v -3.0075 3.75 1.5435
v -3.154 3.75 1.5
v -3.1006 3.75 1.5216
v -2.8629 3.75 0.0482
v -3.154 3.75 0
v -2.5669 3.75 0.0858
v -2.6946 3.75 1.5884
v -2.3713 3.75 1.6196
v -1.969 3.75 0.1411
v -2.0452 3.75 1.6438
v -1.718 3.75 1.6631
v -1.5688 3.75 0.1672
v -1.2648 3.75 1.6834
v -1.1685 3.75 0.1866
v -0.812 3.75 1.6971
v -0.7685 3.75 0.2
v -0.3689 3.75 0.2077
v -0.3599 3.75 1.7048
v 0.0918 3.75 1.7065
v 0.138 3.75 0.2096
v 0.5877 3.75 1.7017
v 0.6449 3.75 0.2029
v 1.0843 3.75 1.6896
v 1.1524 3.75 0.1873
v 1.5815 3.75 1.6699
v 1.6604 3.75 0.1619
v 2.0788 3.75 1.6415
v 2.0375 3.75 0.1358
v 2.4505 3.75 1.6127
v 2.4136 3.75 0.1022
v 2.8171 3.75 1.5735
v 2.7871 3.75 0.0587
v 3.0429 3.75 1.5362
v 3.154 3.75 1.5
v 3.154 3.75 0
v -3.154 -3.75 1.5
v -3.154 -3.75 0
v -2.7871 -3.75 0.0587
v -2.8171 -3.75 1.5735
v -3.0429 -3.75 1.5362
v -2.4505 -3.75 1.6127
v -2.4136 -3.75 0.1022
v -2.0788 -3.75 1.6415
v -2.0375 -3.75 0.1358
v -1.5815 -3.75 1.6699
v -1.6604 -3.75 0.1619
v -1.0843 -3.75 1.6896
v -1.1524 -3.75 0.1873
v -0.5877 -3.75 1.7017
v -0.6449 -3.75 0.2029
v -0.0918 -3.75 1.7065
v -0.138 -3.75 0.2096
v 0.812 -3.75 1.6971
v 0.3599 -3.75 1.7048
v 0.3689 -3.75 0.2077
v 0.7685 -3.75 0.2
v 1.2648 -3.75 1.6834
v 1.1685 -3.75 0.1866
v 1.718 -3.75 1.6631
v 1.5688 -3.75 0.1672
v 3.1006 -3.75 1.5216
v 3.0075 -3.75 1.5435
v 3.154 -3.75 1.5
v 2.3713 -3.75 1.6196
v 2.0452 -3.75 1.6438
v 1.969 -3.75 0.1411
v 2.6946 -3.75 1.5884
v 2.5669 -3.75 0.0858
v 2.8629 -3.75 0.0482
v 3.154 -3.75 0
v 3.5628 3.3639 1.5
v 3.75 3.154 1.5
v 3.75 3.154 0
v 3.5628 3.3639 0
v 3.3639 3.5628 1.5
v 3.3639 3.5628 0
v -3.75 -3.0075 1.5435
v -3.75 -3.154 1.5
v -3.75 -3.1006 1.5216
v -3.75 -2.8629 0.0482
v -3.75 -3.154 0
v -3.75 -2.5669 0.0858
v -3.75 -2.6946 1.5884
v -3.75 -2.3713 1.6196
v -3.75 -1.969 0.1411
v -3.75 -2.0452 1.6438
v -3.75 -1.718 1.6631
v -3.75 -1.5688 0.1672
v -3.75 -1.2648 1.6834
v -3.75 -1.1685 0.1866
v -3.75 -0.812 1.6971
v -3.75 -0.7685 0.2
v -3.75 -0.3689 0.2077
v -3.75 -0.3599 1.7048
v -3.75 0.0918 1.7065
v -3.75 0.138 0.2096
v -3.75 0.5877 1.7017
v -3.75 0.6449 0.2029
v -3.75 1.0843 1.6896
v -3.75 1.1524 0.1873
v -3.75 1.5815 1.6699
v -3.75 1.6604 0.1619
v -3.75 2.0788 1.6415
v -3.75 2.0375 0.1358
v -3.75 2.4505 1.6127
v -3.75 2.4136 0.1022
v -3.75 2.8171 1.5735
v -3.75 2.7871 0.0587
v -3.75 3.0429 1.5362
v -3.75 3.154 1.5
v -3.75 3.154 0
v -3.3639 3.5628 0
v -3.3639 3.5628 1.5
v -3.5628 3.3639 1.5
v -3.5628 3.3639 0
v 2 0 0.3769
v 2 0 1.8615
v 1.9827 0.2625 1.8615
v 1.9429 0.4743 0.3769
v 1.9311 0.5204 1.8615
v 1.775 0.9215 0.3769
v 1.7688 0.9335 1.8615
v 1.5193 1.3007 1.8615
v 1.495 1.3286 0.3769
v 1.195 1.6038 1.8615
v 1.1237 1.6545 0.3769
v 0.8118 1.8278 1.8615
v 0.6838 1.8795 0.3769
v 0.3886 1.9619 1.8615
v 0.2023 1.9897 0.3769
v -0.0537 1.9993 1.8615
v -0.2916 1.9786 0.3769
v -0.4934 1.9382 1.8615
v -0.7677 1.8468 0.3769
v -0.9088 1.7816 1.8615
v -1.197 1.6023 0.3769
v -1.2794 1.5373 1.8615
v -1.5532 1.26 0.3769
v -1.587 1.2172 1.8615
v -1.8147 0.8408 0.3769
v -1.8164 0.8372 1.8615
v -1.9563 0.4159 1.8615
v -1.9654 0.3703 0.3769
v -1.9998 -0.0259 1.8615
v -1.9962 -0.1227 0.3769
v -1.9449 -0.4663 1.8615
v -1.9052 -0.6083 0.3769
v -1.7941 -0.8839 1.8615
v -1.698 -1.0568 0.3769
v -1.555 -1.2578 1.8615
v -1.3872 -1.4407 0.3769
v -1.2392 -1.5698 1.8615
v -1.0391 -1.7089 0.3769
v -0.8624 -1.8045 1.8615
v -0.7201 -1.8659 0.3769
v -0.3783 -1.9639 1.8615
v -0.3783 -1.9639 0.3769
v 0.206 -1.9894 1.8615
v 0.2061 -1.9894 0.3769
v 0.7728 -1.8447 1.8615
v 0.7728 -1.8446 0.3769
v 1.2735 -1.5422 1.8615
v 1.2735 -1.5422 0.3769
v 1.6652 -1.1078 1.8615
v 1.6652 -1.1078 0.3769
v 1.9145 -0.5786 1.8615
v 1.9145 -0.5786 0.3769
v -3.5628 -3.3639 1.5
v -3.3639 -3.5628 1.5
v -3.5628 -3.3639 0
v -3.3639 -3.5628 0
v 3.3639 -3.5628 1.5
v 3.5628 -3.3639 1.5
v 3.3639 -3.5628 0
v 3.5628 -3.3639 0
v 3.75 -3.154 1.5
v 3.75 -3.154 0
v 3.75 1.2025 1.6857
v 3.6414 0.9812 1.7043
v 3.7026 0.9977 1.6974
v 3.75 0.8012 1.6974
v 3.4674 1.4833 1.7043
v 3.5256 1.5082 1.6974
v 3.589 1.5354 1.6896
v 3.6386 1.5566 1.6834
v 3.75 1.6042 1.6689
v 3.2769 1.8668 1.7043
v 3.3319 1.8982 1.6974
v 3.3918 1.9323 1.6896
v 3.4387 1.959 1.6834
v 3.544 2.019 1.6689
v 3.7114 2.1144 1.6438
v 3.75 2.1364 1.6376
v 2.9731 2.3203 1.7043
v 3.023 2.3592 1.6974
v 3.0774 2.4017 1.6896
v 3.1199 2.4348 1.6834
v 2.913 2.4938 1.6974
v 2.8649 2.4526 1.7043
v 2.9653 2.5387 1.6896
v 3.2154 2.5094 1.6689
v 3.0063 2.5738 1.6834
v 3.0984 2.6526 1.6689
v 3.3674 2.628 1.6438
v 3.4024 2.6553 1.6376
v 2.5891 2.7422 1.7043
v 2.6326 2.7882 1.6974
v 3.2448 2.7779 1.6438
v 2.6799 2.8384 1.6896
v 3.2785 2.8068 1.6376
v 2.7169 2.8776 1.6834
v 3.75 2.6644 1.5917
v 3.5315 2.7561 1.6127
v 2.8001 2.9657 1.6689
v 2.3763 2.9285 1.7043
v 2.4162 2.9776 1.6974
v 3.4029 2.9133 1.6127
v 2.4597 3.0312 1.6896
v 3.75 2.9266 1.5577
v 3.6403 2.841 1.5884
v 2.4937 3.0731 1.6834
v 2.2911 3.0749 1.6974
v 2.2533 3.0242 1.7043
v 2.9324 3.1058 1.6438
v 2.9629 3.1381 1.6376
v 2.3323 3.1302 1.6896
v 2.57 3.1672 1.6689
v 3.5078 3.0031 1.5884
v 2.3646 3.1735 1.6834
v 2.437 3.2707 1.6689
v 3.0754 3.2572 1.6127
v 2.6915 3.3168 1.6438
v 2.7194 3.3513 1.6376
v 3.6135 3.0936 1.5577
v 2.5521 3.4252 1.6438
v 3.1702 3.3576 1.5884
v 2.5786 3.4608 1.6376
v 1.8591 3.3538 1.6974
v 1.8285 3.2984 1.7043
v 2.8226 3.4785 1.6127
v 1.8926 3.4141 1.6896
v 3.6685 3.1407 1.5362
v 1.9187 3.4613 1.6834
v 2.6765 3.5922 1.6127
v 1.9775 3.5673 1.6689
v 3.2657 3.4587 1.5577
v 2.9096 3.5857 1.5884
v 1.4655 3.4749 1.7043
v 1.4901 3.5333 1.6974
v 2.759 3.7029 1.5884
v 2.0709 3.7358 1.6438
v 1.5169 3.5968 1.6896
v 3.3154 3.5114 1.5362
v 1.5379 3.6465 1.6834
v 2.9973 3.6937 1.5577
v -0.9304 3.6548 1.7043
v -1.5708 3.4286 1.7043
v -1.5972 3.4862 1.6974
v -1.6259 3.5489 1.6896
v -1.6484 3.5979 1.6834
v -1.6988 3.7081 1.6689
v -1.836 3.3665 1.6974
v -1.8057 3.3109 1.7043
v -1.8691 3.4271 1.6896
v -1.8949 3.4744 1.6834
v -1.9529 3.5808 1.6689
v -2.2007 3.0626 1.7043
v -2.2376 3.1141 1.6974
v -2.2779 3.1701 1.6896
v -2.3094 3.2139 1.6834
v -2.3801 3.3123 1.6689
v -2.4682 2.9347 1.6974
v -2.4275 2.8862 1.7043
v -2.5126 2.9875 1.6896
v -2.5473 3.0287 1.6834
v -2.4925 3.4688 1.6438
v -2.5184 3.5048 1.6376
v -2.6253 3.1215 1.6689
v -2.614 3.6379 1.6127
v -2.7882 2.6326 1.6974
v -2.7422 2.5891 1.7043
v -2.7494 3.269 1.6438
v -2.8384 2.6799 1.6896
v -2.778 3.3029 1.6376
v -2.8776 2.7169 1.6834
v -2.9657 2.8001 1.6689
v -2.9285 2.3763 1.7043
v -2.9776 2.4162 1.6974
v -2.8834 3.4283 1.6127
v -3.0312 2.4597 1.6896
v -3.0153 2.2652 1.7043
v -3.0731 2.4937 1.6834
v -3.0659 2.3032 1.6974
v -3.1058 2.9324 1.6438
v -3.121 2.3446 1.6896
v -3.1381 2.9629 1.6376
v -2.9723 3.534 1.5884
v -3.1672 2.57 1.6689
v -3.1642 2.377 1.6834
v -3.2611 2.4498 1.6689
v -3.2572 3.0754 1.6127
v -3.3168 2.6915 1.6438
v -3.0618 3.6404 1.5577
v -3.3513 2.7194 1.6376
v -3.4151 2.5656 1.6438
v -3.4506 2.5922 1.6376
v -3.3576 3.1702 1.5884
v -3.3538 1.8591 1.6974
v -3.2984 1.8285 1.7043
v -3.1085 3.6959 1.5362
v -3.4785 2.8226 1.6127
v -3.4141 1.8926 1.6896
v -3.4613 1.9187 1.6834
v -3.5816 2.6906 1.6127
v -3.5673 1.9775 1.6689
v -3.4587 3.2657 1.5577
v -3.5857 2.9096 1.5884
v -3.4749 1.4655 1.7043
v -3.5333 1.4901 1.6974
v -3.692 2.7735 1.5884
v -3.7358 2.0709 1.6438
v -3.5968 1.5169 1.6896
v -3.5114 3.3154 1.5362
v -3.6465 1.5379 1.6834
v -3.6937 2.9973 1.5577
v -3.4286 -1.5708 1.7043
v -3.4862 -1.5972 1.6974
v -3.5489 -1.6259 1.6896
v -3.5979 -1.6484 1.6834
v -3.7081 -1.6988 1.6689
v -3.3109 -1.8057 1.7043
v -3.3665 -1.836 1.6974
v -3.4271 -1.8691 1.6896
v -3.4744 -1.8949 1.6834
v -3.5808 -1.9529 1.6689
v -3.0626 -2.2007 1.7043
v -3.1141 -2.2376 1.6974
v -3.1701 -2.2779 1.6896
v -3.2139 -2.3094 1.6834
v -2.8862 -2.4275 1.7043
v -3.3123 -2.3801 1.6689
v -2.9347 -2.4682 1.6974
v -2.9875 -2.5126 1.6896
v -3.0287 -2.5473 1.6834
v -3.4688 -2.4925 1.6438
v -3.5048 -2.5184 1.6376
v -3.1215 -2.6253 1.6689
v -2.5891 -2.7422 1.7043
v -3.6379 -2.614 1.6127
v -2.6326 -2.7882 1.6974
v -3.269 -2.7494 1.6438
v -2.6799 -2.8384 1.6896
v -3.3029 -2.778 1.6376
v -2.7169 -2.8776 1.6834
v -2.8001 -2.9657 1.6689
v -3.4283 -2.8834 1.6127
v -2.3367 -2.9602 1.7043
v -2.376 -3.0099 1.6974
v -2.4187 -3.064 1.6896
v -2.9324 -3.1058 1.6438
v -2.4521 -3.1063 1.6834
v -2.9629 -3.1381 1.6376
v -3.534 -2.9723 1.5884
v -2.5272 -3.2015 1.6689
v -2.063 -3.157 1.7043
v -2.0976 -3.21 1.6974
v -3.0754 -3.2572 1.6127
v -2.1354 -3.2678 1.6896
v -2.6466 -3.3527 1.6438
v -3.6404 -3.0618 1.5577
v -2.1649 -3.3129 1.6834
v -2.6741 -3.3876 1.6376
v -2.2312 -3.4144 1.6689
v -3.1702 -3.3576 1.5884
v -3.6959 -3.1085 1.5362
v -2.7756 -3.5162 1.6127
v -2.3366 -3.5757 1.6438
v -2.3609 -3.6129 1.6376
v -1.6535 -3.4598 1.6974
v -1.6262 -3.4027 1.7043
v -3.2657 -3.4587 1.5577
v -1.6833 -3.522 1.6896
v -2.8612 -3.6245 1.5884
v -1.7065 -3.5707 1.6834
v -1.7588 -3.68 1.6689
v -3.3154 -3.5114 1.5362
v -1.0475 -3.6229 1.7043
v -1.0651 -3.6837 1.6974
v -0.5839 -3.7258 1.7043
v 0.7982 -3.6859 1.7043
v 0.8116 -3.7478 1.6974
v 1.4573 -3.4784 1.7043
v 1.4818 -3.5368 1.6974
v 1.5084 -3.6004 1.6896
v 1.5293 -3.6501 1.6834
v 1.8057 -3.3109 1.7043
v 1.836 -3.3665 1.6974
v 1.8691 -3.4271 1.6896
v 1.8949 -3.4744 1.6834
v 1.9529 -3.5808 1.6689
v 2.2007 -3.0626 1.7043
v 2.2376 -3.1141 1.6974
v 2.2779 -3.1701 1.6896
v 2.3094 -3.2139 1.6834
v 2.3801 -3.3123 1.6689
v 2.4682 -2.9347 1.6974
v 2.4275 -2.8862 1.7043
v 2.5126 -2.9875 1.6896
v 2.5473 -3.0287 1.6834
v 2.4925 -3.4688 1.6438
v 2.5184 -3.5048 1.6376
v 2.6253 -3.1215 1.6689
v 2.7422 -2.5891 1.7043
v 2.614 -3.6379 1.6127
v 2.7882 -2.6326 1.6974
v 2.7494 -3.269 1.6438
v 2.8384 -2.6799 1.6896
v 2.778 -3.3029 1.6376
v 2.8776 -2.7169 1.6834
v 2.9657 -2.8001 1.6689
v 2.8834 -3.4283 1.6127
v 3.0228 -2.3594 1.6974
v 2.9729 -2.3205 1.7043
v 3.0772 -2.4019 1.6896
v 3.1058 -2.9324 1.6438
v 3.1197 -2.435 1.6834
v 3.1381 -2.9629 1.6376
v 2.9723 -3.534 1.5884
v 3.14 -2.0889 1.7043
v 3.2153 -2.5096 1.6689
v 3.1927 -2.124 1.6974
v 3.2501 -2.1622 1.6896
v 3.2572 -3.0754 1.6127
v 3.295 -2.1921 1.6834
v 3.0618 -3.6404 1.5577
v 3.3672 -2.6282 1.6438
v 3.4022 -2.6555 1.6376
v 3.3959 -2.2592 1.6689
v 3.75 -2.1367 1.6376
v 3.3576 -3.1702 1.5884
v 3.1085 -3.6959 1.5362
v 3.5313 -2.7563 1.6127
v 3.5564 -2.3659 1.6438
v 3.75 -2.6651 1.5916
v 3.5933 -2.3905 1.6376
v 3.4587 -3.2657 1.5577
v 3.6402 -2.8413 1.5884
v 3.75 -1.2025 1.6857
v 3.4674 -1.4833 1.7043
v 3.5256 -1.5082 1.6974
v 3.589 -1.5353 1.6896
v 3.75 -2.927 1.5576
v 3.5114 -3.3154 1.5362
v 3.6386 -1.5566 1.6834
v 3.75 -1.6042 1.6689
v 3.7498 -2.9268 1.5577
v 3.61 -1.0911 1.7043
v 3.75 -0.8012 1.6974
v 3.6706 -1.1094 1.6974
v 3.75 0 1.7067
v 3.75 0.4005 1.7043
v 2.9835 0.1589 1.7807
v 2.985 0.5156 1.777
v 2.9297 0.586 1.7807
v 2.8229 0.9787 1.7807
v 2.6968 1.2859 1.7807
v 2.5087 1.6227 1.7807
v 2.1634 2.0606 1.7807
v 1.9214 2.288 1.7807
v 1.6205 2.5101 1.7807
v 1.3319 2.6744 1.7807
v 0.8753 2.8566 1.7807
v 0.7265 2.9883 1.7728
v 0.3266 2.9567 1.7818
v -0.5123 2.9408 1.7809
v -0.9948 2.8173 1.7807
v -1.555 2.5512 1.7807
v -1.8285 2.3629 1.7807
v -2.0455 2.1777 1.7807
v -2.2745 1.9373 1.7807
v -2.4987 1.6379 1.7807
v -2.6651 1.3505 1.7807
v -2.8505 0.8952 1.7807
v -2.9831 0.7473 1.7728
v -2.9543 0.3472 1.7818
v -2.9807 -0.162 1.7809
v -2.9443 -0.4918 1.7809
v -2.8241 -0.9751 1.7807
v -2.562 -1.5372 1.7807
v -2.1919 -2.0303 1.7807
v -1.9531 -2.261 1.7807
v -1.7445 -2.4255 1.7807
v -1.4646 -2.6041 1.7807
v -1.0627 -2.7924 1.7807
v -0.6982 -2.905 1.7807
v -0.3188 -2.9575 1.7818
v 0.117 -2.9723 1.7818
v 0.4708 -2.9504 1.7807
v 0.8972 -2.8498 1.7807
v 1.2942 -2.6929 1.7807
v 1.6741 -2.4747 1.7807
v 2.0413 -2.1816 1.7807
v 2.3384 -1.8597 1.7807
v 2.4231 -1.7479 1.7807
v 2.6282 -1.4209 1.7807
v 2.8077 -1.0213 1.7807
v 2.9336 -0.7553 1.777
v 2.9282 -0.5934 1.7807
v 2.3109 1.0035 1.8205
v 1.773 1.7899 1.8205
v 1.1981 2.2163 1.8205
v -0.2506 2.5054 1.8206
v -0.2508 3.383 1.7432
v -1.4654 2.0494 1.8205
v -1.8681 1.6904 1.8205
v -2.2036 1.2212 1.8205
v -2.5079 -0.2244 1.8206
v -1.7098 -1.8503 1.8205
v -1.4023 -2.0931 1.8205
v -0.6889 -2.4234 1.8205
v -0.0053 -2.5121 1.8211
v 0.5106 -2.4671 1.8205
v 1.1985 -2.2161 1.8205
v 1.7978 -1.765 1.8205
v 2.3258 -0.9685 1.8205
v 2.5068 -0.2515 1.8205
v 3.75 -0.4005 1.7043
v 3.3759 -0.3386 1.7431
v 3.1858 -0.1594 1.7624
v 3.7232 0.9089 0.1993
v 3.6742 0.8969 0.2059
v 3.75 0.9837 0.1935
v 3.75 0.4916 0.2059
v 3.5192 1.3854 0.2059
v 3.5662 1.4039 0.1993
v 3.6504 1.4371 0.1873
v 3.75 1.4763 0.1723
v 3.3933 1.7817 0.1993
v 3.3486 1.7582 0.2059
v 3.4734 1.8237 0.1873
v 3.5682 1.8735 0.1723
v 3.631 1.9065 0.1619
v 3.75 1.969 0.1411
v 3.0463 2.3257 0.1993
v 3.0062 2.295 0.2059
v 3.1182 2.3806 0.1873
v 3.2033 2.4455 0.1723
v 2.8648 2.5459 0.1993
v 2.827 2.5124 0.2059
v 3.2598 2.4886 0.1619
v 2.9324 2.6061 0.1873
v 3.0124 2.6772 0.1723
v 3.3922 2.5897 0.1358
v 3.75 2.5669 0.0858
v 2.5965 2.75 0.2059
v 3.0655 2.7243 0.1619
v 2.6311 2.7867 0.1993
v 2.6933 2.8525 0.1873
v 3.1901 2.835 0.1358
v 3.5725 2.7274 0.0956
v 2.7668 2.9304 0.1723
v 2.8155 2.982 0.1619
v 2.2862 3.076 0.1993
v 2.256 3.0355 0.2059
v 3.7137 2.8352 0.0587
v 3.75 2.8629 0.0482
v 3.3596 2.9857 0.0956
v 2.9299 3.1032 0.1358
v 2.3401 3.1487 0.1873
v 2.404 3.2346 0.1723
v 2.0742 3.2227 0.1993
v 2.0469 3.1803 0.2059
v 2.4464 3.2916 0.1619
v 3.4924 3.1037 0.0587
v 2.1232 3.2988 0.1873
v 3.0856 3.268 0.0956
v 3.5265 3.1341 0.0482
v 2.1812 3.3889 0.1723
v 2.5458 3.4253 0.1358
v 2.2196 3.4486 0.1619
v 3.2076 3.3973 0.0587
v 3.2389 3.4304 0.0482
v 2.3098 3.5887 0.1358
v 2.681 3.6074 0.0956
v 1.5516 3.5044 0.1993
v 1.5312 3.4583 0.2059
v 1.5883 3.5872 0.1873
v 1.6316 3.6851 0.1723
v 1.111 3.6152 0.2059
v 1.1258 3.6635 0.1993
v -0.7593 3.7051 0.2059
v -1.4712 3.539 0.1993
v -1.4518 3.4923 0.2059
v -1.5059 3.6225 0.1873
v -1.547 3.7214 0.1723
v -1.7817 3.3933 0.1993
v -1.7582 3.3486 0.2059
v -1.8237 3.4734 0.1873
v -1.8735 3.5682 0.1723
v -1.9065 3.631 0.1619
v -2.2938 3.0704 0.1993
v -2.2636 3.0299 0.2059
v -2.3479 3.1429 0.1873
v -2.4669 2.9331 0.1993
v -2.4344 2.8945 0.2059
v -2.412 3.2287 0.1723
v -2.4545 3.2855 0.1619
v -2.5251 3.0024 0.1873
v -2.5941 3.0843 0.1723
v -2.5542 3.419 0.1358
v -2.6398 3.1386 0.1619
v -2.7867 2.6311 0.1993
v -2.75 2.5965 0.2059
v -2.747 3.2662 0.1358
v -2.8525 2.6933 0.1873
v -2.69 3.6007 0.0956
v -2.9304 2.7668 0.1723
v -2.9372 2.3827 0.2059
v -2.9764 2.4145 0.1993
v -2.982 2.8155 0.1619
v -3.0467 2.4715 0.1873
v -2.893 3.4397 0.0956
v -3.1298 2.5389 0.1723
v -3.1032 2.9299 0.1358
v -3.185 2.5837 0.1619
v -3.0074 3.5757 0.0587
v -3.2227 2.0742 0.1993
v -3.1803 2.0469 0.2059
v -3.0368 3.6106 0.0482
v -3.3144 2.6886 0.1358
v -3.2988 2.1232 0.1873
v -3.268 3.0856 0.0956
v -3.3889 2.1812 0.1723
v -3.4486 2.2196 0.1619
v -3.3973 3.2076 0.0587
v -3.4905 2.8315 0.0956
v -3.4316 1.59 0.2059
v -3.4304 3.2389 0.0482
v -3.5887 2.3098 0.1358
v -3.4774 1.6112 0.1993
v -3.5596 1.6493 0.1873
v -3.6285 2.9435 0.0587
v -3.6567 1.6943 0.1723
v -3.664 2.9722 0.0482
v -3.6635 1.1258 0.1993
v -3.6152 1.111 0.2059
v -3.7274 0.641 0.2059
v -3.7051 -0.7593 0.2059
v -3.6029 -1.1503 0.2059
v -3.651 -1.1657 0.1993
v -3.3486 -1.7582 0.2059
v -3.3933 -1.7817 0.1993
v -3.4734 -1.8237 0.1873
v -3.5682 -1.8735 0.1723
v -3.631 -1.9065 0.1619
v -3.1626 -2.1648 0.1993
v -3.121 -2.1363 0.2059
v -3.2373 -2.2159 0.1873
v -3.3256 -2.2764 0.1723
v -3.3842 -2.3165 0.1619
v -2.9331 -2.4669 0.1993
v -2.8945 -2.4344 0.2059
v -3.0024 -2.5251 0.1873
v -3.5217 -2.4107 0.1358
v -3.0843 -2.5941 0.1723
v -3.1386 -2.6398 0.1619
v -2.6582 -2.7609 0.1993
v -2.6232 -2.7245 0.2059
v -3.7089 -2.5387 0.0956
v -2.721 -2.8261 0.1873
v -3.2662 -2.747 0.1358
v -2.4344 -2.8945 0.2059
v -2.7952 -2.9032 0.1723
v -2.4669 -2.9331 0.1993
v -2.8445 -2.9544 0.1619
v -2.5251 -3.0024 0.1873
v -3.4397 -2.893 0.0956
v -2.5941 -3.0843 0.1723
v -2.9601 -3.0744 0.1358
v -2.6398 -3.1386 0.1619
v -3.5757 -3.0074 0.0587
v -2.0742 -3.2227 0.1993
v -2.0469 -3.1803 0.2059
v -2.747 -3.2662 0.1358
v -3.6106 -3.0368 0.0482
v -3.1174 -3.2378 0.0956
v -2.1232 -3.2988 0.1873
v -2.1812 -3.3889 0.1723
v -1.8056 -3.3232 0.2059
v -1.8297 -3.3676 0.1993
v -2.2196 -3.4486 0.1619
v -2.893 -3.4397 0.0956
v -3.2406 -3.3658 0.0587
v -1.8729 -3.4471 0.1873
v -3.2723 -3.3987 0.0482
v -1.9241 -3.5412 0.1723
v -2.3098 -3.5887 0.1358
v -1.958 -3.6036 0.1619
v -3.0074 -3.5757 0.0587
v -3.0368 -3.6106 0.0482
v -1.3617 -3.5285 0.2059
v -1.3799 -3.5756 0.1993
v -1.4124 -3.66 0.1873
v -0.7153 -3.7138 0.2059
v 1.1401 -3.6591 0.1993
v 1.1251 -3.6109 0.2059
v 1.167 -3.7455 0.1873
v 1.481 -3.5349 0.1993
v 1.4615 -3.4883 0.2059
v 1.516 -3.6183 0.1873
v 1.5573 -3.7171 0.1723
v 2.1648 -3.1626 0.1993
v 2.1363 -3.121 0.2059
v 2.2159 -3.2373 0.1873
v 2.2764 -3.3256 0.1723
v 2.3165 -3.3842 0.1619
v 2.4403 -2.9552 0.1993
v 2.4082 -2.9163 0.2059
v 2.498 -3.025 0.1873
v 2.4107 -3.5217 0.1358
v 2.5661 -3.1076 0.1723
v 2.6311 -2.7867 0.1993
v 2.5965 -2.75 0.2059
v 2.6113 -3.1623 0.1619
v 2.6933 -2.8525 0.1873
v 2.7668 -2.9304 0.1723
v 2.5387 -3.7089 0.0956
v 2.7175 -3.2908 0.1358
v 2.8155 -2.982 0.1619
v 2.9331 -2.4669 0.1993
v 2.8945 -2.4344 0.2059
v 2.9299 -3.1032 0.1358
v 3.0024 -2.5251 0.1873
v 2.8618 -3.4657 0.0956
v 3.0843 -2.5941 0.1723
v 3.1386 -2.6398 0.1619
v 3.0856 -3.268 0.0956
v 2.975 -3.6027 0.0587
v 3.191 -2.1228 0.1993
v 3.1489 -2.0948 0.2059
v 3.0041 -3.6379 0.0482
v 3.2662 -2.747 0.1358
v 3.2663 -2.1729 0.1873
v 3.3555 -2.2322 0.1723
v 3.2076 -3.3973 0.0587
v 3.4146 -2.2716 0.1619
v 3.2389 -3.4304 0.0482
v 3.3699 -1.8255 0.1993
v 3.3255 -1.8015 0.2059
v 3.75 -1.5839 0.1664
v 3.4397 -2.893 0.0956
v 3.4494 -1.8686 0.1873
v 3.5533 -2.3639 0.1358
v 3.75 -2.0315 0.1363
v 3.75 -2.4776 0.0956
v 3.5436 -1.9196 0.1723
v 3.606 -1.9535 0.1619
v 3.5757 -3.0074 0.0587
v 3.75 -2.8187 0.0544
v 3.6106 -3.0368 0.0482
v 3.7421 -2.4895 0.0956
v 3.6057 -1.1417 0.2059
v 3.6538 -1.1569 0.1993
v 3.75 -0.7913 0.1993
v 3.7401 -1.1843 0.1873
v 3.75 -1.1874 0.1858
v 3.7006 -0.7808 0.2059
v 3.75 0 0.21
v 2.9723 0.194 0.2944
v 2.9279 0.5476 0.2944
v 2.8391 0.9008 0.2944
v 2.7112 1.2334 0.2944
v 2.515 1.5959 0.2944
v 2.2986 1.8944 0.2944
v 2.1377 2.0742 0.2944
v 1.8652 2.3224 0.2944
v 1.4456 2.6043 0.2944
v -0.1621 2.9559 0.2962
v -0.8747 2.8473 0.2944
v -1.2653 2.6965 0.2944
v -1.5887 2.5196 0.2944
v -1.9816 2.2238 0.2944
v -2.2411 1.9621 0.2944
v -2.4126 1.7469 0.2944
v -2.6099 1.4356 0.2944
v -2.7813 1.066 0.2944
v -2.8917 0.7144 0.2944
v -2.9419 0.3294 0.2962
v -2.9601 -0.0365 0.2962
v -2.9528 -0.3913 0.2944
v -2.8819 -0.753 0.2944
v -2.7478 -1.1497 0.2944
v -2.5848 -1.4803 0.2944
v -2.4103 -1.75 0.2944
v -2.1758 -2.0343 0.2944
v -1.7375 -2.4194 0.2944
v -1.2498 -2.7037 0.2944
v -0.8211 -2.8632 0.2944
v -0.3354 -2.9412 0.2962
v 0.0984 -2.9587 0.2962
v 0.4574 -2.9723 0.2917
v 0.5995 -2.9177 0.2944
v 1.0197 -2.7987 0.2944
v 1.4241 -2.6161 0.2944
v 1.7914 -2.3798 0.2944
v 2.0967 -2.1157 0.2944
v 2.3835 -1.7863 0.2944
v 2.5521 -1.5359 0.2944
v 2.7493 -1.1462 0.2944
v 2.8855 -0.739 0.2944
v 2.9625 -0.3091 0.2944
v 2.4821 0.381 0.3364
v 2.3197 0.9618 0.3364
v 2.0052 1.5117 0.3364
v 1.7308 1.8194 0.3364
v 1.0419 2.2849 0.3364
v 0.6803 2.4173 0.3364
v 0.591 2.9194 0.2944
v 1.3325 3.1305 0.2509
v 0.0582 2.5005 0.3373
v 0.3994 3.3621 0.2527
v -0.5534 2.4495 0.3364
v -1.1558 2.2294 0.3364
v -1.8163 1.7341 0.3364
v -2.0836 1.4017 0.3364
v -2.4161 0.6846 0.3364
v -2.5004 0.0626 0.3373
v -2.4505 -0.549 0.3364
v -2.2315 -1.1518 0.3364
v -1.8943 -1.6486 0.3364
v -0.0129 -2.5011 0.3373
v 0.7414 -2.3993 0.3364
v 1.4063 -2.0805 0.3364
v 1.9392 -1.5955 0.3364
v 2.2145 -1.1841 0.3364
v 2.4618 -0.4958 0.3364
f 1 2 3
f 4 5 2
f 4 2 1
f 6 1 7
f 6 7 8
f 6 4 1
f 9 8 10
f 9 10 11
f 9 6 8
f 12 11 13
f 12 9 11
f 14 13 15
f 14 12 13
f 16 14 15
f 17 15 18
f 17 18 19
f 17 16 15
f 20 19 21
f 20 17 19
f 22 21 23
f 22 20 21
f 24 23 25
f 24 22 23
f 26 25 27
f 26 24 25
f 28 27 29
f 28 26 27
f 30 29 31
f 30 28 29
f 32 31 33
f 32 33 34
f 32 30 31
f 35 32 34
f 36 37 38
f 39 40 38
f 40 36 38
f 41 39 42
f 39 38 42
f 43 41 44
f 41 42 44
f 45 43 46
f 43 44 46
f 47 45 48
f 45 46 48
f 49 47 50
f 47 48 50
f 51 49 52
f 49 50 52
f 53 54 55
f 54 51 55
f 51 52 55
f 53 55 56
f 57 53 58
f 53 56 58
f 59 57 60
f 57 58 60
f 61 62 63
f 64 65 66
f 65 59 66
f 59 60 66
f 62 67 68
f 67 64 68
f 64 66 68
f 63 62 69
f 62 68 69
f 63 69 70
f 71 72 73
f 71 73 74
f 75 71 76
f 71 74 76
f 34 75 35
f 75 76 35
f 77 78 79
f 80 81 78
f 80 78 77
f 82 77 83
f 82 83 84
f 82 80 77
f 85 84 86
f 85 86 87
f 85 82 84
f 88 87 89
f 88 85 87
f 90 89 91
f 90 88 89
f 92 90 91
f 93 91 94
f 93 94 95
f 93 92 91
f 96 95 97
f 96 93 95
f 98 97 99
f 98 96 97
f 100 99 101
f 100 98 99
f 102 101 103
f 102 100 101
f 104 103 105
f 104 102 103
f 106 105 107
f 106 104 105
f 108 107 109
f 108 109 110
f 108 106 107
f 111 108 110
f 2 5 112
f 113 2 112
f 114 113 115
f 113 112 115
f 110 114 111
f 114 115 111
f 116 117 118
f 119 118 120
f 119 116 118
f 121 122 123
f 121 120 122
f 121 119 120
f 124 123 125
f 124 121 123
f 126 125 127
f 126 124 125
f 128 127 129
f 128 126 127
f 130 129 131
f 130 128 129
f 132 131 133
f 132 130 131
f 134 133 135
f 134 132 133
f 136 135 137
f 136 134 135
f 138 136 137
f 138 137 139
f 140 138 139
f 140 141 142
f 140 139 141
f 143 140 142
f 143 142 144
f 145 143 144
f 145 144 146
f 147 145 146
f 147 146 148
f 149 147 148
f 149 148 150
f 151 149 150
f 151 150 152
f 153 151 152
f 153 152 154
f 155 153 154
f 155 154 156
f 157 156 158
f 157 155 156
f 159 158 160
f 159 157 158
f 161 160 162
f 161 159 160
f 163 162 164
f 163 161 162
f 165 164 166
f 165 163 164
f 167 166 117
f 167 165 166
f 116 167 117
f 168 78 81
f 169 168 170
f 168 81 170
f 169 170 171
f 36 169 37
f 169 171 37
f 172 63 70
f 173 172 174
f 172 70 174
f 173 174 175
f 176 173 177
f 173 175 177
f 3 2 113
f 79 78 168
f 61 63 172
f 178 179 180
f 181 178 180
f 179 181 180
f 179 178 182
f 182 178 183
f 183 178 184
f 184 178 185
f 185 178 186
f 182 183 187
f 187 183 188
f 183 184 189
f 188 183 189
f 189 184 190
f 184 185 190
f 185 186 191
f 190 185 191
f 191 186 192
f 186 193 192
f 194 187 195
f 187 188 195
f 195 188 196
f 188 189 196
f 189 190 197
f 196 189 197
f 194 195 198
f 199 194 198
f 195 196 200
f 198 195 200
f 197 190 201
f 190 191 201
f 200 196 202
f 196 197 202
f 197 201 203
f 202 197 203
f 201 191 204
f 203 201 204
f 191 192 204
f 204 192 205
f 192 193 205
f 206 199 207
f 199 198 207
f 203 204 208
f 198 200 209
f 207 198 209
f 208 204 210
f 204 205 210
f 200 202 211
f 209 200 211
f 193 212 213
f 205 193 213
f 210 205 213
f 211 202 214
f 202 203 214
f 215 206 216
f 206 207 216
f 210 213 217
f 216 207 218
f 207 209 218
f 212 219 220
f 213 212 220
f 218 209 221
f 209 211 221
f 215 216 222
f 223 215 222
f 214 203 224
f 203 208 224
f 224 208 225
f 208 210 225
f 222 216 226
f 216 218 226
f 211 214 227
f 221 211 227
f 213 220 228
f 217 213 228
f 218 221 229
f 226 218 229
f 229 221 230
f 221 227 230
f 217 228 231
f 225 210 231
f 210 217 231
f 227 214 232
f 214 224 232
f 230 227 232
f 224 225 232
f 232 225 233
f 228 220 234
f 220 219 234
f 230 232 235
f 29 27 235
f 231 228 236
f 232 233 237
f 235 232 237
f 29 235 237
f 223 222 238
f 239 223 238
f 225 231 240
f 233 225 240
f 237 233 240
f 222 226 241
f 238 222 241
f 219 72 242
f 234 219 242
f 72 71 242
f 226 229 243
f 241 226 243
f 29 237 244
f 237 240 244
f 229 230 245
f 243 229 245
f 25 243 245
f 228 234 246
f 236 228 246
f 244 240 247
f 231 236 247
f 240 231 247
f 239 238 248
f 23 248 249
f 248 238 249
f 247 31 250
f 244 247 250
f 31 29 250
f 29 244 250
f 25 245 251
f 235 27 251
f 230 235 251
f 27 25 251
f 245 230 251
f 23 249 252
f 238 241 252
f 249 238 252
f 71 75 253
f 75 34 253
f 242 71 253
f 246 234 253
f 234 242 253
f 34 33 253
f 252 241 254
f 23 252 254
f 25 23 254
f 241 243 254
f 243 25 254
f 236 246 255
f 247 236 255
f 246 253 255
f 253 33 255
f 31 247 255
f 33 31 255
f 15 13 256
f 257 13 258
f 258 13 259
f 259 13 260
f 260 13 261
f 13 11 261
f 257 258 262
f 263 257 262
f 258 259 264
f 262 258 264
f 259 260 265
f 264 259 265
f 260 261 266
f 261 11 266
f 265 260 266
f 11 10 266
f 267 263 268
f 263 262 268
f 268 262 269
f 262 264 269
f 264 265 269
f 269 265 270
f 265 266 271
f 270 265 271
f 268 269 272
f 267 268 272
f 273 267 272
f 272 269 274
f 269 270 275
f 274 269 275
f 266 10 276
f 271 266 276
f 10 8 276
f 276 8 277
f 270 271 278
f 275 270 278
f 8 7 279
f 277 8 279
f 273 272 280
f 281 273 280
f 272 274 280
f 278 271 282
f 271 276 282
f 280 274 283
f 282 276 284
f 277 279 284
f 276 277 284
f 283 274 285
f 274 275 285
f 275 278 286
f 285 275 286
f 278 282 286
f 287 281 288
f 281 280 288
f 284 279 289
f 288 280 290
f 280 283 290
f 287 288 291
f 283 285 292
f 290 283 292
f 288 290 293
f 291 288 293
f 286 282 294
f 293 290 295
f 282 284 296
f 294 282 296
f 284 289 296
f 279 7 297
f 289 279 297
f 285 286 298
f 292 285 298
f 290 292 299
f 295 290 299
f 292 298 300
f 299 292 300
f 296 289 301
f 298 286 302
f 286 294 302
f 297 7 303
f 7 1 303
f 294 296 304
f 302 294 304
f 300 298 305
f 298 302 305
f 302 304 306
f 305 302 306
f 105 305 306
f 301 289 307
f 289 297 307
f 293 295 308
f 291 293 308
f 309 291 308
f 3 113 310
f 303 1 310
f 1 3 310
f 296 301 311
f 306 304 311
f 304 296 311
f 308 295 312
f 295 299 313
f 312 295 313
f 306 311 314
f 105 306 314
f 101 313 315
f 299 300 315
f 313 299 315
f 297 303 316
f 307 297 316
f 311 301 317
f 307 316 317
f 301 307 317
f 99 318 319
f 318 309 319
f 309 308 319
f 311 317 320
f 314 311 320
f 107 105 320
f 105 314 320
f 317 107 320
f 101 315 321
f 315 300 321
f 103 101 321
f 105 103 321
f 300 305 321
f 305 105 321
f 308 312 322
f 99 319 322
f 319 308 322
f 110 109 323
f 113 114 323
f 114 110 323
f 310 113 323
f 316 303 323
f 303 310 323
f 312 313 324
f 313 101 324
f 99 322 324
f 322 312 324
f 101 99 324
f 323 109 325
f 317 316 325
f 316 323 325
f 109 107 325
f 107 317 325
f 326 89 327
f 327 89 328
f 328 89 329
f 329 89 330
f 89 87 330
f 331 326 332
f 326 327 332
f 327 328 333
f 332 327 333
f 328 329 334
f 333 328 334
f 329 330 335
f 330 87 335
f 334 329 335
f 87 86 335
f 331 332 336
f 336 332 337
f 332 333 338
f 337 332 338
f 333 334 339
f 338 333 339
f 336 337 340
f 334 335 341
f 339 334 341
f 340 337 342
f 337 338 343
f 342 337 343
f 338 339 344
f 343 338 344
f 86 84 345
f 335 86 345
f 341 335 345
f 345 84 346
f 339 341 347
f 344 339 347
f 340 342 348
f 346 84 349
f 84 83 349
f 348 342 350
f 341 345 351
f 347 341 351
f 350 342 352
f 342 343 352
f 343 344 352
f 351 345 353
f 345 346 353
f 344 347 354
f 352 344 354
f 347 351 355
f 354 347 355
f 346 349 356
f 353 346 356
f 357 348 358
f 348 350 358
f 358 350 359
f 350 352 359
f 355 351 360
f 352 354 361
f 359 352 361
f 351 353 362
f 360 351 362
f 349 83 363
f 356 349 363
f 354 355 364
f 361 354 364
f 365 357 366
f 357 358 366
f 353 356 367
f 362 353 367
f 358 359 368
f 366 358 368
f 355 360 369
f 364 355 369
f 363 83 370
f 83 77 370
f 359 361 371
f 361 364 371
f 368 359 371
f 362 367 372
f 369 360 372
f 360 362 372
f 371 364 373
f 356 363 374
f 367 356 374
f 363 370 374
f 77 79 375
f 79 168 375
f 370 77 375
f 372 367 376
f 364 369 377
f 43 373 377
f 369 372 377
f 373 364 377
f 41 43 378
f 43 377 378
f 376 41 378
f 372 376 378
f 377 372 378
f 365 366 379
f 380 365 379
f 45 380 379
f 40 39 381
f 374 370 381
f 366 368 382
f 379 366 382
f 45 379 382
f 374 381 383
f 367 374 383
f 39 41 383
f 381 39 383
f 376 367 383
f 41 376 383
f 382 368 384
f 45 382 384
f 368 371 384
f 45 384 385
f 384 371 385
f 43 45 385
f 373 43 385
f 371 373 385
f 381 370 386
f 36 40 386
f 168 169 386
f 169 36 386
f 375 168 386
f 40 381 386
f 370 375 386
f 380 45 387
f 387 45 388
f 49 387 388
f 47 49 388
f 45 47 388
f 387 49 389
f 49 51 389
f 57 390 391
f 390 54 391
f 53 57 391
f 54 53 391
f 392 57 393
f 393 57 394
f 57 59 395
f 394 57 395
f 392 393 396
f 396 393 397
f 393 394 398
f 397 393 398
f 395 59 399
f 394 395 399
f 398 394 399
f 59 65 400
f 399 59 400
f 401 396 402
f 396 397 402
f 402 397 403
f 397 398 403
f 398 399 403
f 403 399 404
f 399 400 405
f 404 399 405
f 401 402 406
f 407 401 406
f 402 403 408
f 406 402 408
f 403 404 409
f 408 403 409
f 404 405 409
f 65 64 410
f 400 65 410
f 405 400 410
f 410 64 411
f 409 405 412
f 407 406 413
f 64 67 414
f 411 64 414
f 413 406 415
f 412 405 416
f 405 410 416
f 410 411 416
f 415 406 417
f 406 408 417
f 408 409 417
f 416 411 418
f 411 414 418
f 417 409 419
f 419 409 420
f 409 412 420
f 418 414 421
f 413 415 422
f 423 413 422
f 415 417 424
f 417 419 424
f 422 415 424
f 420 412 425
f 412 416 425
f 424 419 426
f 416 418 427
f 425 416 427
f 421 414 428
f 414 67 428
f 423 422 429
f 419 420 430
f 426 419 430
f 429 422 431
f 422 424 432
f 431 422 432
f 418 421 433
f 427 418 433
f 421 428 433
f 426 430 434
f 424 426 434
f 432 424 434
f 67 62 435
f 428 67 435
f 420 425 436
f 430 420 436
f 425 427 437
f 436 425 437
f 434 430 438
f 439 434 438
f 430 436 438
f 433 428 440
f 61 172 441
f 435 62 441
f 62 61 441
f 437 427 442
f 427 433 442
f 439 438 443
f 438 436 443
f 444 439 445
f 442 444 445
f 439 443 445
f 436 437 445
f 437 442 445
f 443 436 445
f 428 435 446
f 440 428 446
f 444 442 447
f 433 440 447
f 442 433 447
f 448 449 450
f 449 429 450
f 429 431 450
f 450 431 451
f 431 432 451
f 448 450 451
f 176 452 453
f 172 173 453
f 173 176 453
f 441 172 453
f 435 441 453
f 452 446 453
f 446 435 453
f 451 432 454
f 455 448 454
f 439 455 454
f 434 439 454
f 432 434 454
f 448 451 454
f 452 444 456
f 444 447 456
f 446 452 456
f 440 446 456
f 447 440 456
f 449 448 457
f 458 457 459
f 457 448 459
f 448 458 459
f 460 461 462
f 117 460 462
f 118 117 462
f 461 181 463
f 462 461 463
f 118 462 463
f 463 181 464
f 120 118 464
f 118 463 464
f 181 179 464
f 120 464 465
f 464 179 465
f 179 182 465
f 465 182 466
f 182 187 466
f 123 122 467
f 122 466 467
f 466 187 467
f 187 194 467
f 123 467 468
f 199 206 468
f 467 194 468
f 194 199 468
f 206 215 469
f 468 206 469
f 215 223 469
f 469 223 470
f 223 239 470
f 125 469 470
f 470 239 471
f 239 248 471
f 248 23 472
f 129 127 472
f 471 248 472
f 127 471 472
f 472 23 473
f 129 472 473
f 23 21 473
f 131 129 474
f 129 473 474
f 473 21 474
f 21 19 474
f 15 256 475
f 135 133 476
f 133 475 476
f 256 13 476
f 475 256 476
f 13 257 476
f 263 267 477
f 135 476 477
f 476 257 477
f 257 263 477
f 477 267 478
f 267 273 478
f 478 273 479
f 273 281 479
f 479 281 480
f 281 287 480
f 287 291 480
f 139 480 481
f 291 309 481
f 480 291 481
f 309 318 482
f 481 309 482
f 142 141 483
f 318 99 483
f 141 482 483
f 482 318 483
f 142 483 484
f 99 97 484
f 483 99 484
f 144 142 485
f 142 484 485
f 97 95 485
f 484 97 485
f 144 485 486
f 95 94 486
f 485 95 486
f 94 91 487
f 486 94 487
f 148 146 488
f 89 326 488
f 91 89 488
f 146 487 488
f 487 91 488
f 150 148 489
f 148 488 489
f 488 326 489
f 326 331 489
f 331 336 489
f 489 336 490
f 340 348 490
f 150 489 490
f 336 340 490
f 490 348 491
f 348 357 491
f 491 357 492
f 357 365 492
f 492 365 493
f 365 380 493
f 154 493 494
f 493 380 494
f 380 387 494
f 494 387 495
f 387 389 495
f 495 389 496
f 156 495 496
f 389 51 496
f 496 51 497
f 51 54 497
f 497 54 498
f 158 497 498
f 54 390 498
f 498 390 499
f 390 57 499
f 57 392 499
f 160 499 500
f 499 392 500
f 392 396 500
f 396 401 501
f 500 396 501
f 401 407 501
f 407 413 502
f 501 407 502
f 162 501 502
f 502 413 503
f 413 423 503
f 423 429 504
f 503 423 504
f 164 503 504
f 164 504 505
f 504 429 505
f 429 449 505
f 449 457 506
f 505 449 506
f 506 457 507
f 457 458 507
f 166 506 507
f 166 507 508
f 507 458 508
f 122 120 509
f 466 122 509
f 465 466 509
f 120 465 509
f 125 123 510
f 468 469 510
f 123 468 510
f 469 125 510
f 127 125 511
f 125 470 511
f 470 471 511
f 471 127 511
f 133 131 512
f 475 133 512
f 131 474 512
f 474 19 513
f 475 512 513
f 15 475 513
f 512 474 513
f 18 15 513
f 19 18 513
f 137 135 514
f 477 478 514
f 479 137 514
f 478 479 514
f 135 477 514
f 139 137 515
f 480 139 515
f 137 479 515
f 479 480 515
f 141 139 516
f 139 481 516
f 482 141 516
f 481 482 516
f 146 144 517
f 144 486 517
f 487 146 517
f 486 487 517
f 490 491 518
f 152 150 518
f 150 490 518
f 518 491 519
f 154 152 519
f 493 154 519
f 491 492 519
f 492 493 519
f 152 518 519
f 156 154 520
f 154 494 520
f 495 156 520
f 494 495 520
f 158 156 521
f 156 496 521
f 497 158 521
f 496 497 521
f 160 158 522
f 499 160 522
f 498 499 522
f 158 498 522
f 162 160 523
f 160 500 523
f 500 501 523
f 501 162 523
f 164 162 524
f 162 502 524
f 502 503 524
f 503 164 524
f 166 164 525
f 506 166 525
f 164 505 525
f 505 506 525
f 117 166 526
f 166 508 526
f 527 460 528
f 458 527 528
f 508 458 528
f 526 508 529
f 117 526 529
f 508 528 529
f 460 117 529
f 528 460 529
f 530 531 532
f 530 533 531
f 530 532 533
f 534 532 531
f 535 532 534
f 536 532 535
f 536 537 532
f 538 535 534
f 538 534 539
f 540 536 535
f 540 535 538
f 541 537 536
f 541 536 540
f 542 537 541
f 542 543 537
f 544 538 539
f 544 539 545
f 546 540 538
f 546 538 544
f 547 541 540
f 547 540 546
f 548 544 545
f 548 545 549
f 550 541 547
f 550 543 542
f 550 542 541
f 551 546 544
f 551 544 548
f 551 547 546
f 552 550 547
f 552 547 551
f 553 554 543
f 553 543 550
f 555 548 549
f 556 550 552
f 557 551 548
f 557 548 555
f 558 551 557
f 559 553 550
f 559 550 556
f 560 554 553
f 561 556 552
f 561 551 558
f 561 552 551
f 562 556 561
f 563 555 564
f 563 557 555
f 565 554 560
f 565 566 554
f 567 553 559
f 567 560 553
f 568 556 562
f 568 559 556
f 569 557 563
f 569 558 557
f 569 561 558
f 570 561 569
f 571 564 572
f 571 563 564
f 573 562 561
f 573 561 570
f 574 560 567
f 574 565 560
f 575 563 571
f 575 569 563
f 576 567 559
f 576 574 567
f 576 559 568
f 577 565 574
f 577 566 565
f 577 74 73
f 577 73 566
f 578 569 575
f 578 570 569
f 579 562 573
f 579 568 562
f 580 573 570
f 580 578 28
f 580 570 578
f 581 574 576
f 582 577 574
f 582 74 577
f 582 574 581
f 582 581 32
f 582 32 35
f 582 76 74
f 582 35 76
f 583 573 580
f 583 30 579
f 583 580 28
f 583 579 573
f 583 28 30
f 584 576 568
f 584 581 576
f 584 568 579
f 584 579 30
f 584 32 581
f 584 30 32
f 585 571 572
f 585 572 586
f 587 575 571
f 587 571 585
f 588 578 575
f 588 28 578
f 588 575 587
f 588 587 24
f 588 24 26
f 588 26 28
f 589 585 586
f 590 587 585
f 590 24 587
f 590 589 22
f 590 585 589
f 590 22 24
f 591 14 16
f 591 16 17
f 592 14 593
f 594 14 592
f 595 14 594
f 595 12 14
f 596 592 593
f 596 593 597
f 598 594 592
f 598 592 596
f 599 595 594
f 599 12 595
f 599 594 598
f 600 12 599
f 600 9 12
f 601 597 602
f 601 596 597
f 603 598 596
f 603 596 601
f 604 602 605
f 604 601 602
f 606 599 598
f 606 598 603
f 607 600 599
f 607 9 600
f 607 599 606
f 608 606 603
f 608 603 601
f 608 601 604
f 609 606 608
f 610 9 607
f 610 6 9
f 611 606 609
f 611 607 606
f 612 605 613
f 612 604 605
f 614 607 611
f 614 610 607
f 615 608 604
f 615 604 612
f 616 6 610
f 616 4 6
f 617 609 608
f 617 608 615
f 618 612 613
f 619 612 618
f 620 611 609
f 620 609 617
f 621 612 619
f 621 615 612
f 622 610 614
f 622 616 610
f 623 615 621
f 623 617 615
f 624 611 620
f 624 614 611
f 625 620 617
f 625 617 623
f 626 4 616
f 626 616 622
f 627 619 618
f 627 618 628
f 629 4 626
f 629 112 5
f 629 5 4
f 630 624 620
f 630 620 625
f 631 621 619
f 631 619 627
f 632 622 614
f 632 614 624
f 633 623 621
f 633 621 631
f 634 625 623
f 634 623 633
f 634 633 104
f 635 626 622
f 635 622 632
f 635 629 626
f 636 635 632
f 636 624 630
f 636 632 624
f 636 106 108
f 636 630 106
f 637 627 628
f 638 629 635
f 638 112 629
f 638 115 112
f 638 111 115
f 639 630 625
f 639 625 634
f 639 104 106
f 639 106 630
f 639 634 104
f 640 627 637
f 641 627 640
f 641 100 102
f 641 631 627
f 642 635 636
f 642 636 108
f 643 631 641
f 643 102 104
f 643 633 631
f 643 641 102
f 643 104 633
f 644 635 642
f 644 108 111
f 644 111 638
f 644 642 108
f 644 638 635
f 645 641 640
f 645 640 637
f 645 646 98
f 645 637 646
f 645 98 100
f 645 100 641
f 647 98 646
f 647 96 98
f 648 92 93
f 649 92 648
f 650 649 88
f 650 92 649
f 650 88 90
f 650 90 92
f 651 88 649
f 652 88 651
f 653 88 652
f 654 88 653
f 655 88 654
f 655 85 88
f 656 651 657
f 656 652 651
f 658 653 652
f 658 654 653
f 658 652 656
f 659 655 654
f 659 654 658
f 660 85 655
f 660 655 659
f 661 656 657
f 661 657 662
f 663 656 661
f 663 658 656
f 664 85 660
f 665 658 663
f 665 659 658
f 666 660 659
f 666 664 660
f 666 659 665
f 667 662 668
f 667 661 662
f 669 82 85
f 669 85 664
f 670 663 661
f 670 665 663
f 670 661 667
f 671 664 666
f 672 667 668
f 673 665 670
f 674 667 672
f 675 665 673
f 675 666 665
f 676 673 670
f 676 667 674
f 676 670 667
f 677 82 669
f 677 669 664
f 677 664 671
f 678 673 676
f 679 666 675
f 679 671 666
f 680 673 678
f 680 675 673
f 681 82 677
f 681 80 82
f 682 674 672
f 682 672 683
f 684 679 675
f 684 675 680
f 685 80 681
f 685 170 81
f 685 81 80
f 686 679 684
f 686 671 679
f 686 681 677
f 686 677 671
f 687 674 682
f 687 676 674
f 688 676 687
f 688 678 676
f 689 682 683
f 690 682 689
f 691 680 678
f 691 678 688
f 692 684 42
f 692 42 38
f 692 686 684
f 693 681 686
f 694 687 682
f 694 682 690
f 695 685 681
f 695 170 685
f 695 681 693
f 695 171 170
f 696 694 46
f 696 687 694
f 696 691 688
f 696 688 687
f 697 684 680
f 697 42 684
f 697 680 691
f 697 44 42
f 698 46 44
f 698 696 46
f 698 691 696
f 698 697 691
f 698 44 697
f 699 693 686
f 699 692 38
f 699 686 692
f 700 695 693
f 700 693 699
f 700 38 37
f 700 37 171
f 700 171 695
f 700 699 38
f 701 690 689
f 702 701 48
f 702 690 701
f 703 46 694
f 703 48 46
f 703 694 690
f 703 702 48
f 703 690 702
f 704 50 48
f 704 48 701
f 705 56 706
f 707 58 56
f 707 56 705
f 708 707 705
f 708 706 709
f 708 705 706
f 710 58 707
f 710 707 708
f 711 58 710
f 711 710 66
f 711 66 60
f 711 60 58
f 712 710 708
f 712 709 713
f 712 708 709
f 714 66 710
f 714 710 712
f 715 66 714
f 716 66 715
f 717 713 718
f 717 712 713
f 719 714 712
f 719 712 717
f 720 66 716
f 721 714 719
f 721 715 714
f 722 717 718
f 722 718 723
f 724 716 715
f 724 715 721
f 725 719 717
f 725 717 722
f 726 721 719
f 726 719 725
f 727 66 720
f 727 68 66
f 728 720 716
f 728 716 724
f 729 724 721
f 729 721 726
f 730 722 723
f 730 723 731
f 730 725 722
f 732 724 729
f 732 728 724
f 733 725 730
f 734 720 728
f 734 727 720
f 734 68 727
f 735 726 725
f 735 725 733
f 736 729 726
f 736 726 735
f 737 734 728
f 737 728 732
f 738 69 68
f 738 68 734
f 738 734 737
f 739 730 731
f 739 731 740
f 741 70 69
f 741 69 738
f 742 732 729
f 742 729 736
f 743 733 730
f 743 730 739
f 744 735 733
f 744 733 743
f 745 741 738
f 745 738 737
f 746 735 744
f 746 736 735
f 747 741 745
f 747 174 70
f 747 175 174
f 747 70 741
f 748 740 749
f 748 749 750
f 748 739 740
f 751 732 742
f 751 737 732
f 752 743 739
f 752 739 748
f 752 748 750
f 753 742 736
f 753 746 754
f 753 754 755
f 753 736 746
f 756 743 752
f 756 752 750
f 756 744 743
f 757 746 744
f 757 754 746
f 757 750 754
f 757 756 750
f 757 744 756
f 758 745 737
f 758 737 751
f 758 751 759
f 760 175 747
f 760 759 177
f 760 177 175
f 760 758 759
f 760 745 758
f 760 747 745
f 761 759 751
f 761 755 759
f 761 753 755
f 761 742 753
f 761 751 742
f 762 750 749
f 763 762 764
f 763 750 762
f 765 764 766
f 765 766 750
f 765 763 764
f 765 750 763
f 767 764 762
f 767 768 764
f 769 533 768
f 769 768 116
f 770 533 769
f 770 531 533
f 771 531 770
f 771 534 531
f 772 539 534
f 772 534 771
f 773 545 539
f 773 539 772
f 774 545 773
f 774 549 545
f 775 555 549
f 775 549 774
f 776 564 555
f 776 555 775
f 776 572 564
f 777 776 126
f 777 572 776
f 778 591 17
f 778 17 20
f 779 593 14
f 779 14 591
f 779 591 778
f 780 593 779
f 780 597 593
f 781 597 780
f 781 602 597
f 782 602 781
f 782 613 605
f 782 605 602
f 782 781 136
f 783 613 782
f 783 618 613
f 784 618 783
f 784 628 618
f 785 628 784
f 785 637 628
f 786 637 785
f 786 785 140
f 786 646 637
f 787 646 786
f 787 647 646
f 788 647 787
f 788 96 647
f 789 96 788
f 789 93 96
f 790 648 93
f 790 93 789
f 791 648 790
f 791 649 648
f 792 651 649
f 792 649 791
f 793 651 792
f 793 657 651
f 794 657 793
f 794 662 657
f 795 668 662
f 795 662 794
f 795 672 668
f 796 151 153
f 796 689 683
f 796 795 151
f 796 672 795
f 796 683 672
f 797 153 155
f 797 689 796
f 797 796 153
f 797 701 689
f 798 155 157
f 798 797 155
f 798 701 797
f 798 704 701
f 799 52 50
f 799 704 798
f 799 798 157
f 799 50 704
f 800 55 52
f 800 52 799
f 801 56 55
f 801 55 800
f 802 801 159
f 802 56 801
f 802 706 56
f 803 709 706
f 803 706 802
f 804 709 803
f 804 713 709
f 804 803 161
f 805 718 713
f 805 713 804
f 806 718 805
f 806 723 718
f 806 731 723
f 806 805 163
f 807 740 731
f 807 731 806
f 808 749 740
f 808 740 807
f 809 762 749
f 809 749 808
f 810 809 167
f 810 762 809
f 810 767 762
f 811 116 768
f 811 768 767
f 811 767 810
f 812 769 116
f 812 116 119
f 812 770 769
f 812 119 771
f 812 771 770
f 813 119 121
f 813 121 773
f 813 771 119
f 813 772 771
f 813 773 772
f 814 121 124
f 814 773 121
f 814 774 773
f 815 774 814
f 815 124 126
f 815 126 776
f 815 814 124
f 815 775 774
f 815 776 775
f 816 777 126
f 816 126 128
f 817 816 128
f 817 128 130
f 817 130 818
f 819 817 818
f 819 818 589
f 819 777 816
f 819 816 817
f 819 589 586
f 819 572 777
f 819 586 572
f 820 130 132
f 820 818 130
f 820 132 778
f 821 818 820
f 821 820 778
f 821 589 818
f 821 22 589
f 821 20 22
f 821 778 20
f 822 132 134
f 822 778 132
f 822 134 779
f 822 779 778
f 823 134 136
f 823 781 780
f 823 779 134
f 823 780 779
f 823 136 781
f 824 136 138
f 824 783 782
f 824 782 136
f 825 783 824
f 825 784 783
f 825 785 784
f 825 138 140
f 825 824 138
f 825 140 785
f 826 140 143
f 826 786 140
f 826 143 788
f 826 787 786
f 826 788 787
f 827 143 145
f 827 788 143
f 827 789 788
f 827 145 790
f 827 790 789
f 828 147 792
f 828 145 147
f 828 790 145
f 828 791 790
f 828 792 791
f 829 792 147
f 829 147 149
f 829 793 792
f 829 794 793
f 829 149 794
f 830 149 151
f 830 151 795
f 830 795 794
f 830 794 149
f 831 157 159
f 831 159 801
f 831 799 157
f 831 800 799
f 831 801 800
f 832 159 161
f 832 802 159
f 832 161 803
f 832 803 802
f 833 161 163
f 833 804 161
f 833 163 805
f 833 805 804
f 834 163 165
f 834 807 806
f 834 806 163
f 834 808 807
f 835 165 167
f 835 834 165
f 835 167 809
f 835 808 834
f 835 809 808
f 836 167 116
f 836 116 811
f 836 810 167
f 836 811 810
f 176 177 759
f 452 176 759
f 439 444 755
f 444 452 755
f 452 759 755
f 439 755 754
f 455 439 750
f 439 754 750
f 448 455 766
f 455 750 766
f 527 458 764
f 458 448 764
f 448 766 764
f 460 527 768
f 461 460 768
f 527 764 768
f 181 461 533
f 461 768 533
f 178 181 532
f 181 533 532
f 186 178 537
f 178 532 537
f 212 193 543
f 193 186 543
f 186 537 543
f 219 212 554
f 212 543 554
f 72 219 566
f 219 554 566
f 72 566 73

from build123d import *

# Parameters (mm, degrees)
SKETCH001_W     = 10
SKETCH001_H     = 10
SKETCH001_W_2   = 7.5
SKETCH001_H_2   = 7.5
POCKET_DEPTH    = 5
SKETCH002_R     = 2
POCKET001_DEPTH = 5


with BuildPart() as part:
    # Sketch → Revolution (revolve)
    with BuildSketch(Plane.XZ):
        with BuildLine():
            add(Edge.make_bspline(
                [(0, 2), (4.7, 1.7), (4.9, 1.5)],
                knots=[0, 0, 0, 1, 1, 1], degree=2))
            Line((4.9, 1.5), (4.9, 0))
            add(Edge.make_bspline(
                [(0, 0.5), (3.9, 0.3), (4.9, 0)],
                knots=[0, 0, 0, 1, 1, 1], degree=2))
            Line((0, 0.5), (0, 2))
        make_face()
    revolve(axis=Axis((0, 0, 0), (0, 0, 1)))

    # Sketch001 → Pocket (cut)
    with BuildSketch(Plane.XY):
        Rectangle(SKETCH001_W, SKETCH001_H)
        Rectangle(SKETCH001_W_2, SKETCH001_H_2, mode=Mode.SUBTRACT)
    extrude(amount=POCKET_DEPTH, mode=Mode.SUBTRACT)

    # Sketch002 → Pocket001 (cut)
    with BuildSketch(Plane.XY):
        Circle(SKETCH002_R)
    extrude(amount=POCKET001_DEPTH, mode=Mode.SUBTRACT)


solid = part.part
